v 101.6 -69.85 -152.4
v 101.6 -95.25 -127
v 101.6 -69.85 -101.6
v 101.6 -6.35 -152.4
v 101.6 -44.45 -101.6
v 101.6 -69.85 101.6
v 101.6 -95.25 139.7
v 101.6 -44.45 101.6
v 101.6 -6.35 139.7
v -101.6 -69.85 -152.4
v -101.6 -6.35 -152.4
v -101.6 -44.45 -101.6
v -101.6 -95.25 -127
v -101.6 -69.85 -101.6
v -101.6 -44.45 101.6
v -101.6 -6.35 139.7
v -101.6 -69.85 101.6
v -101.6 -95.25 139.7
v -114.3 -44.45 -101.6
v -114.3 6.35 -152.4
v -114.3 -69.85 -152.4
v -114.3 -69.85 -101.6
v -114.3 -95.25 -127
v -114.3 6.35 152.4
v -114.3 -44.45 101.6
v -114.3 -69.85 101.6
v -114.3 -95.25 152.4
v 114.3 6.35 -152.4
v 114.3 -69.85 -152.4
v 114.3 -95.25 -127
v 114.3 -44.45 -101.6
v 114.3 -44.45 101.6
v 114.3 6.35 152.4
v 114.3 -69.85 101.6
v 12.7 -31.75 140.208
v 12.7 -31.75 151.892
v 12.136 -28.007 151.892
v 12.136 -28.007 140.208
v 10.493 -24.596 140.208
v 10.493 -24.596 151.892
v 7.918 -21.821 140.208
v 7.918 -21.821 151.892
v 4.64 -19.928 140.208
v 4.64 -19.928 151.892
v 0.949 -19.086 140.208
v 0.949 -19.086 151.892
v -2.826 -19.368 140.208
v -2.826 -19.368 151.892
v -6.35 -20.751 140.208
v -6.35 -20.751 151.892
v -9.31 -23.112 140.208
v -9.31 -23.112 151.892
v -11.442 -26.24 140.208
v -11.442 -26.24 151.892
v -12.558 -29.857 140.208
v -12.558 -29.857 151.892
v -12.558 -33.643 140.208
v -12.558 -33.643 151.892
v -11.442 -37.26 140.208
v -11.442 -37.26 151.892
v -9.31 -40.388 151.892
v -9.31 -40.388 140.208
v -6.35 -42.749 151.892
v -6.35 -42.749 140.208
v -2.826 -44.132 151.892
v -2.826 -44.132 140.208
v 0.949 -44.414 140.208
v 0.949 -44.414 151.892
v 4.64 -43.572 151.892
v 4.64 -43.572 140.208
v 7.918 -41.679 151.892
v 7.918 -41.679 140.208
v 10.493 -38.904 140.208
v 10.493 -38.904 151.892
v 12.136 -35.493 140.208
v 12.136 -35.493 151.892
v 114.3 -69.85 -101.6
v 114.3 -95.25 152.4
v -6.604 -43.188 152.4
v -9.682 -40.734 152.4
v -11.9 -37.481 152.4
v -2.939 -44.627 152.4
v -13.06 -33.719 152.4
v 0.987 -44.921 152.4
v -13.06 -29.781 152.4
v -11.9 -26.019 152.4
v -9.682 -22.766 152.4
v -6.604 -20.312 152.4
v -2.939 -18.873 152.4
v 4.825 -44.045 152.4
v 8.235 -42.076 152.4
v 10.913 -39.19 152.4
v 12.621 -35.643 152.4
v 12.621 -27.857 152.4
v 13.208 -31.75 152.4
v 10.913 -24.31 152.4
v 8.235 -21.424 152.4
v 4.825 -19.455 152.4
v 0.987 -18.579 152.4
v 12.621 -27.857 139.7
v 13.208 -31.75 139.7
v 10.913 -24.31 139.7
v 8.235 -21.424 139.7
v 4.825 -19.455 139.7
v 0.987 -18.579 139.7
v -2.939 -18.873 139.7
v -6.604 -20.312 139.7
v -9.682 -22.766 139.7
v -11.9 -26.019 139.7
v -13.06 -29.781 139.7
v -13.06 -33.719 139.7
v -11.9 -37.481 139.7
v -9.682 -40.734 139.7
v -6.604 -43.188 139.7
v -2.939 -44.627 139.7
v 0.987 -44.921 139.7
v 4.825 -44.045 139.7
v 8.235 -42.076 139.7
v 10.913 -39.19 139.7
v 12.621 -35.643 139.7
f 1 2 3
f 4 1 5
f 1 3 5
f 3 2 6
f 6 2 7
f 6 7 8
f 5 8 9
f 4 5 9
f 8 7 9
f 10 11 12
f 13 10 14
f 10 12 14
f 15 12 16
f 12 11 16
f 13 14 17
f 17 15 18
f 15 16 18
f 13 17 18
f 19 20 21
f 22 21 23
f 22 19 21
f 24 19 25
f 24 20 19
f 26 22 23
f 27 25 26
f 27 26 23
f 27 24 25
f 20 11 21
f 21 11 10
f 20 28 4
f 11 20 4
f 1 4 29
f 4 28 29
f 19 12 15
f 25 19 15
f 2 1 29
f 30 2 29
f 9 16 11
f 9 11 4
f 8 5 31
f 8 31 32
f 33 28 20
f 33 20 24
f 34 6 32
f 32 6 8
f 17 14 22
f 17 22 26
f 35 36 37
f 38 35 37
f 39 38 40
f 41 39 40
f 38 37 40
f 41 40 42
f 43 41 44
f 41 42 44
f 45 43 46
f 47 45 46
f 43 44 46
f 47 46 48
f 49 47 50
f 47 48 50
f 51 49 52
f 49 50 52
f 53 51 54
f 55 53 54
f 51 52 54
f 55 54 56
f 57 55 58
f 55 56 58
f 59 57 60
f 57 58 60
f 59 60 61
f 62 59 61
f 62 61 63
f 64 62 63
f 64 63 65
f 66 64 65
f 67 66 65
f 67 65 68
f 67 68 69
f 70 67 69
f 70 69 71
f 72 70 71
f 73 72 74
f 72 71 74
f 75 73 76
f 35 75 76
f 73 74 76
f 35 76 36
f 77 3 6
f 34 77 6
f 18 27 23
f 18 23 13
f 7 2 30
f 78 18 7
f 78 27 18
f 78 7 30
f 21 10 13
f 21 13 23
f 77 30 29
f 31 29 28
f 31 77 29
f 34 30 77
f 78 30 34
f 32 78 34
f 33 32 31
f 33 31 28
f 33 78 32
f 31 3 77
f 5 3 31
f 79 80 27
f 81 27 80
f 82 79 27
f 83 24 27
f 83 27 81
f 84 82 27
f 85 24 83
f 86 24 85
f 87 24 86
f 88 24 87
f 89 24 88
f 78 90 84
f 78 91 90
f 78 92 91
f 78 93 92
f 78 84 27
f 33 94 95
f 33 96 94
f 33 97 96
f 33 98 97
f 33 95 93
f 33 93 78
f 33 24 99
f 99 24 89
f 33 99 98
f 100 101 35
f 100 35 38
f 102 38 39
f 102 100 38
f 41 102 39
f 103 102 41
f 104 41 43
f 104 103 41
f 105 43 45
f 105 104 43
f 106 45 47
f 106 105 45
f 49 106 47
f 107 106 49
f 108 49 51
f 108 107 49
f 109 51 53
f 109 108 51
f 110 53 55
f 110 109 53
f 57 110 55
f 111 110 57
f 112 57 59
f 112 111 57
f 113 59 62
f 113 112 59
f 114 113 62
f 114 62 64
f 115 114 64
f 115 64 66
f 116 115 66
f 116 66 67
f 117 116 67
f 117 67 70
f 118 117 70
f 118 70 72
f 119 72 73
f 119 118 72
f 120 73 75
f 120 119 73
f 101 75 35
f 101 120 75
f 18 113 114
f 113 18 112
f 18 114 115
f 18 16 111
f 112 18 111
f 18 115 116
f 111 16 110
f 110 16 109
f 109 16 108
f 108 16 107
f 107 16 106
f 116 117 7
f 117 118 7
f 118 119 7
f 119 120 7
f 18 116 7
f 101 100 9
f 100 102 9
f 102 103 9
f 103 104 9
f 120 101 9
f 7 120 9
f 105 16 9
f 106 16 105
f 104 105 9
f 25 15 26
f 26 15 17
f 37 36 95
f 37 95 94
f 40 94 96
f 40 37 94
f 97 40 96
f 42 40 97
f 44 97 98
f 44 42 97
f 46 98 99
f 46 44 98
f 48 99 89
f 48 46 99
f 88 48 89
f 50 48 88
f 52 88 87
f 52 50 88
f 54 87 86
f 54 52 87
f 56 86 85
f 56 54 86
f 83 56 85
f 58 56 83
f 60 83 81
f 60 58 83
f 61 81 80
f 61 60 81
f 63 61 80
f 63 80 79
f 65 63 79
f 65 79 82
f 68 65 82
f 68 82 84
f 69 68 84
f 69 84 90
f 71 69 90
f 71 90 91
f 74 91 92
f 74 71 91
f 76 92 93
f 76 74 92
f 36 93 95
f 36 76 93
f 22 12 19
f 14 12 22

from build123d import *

# Parameters (mm, degrees)
F0_W     = 203.2
F0_H     = 304.8
F1_DEPTH = 6.35
F2_W     = 12.7
F2_H     = 304.8
F2_W_2   = 88.9
F2_W_3   = 25.4
F2_H_2   = 203.2
F3_DEPTH = 12.7
F4_W     = 88.9
F4_H     = 304.8
F4_W_2   = 25.4
F4_H_2   = 203.2
F4_W_3   = 12.7
F5_DEPTH = 12.7
F6_W     = 203.2
F6_H     = 88.9
F6_R     = 12.7
F7_DEPTH = 12.7
F8_SIZE  = 0.508
F9_SIZE  = 25.4


with BuildPart() as f1:
    # F0 (on Front) → F1 (new body, symmetric)
    with BuildSketch(Plane.XZ):
        Rectangle(F0_W, F0_H)
    extrude(amount=F1_DEPTH, both=True)

    # F2 (on face) → F3 (join)
    with BuildSketch(Plane.YZ.offset(101.6)):
        Rectangle(F2_W, F2_H)
        with Locations((-50.8, 0)):
            Rectangle(F2_W_2, F2_H)
        with Locations((-57.15, 0)):
            Rectangle(F2_W_3, F2_H_2, mode=Mode.SUBTRACT)
    extrude(amount=F3_DEPTH)

    # F4 (on face) → F5 (join)
    with BuildSketch(Plane(origin=(-101.6, 0, 0), x_dir=(0, -1, 0), z_dir=(-1, 0, 0))):
        with Locations((50.8, 0)):
            Rectangle(F4_W, F4_H)
        with Locations((57.15, 0)):
            Rectangle(F4_W_2, F4_H_2, mode=Mode.SUBTRACT)
        Rectangle(F4_W_3, F4_H)
    extrude(amount=F5_DEPTH)

    # F6 (on face) → F7 (join)
    with BuildSketch(Plane.XY.offset(152.4)):
        with Locations((0, -50.8)):
            Rectangle(F6_W, F6_H)
        with Locations((0, -31.75)):
            Circle(F6_R, mode=Mode.SUBTRACT)
    extrude(amount=-F7_DEPTH)

    # F8
    f8_edges = [f1.edges().sort_by_distance(p)[0] for p in [
        (-12.7, -31.75, 152.4),
        (-12.7, -31.75, 139.7),
    ]]
    chamfer(f8_edges, length=F8_SIZE)

    # F9
    f9_edges = [f1.edges().sort_by_distance(p)[0] for p in [
        (107.95, -95.25, -152.4),
        (-107.95, -95.25, -152.4),
    ]]
    chamfer(f9_edges, length=F9_SIZE)


solid = f1.part
